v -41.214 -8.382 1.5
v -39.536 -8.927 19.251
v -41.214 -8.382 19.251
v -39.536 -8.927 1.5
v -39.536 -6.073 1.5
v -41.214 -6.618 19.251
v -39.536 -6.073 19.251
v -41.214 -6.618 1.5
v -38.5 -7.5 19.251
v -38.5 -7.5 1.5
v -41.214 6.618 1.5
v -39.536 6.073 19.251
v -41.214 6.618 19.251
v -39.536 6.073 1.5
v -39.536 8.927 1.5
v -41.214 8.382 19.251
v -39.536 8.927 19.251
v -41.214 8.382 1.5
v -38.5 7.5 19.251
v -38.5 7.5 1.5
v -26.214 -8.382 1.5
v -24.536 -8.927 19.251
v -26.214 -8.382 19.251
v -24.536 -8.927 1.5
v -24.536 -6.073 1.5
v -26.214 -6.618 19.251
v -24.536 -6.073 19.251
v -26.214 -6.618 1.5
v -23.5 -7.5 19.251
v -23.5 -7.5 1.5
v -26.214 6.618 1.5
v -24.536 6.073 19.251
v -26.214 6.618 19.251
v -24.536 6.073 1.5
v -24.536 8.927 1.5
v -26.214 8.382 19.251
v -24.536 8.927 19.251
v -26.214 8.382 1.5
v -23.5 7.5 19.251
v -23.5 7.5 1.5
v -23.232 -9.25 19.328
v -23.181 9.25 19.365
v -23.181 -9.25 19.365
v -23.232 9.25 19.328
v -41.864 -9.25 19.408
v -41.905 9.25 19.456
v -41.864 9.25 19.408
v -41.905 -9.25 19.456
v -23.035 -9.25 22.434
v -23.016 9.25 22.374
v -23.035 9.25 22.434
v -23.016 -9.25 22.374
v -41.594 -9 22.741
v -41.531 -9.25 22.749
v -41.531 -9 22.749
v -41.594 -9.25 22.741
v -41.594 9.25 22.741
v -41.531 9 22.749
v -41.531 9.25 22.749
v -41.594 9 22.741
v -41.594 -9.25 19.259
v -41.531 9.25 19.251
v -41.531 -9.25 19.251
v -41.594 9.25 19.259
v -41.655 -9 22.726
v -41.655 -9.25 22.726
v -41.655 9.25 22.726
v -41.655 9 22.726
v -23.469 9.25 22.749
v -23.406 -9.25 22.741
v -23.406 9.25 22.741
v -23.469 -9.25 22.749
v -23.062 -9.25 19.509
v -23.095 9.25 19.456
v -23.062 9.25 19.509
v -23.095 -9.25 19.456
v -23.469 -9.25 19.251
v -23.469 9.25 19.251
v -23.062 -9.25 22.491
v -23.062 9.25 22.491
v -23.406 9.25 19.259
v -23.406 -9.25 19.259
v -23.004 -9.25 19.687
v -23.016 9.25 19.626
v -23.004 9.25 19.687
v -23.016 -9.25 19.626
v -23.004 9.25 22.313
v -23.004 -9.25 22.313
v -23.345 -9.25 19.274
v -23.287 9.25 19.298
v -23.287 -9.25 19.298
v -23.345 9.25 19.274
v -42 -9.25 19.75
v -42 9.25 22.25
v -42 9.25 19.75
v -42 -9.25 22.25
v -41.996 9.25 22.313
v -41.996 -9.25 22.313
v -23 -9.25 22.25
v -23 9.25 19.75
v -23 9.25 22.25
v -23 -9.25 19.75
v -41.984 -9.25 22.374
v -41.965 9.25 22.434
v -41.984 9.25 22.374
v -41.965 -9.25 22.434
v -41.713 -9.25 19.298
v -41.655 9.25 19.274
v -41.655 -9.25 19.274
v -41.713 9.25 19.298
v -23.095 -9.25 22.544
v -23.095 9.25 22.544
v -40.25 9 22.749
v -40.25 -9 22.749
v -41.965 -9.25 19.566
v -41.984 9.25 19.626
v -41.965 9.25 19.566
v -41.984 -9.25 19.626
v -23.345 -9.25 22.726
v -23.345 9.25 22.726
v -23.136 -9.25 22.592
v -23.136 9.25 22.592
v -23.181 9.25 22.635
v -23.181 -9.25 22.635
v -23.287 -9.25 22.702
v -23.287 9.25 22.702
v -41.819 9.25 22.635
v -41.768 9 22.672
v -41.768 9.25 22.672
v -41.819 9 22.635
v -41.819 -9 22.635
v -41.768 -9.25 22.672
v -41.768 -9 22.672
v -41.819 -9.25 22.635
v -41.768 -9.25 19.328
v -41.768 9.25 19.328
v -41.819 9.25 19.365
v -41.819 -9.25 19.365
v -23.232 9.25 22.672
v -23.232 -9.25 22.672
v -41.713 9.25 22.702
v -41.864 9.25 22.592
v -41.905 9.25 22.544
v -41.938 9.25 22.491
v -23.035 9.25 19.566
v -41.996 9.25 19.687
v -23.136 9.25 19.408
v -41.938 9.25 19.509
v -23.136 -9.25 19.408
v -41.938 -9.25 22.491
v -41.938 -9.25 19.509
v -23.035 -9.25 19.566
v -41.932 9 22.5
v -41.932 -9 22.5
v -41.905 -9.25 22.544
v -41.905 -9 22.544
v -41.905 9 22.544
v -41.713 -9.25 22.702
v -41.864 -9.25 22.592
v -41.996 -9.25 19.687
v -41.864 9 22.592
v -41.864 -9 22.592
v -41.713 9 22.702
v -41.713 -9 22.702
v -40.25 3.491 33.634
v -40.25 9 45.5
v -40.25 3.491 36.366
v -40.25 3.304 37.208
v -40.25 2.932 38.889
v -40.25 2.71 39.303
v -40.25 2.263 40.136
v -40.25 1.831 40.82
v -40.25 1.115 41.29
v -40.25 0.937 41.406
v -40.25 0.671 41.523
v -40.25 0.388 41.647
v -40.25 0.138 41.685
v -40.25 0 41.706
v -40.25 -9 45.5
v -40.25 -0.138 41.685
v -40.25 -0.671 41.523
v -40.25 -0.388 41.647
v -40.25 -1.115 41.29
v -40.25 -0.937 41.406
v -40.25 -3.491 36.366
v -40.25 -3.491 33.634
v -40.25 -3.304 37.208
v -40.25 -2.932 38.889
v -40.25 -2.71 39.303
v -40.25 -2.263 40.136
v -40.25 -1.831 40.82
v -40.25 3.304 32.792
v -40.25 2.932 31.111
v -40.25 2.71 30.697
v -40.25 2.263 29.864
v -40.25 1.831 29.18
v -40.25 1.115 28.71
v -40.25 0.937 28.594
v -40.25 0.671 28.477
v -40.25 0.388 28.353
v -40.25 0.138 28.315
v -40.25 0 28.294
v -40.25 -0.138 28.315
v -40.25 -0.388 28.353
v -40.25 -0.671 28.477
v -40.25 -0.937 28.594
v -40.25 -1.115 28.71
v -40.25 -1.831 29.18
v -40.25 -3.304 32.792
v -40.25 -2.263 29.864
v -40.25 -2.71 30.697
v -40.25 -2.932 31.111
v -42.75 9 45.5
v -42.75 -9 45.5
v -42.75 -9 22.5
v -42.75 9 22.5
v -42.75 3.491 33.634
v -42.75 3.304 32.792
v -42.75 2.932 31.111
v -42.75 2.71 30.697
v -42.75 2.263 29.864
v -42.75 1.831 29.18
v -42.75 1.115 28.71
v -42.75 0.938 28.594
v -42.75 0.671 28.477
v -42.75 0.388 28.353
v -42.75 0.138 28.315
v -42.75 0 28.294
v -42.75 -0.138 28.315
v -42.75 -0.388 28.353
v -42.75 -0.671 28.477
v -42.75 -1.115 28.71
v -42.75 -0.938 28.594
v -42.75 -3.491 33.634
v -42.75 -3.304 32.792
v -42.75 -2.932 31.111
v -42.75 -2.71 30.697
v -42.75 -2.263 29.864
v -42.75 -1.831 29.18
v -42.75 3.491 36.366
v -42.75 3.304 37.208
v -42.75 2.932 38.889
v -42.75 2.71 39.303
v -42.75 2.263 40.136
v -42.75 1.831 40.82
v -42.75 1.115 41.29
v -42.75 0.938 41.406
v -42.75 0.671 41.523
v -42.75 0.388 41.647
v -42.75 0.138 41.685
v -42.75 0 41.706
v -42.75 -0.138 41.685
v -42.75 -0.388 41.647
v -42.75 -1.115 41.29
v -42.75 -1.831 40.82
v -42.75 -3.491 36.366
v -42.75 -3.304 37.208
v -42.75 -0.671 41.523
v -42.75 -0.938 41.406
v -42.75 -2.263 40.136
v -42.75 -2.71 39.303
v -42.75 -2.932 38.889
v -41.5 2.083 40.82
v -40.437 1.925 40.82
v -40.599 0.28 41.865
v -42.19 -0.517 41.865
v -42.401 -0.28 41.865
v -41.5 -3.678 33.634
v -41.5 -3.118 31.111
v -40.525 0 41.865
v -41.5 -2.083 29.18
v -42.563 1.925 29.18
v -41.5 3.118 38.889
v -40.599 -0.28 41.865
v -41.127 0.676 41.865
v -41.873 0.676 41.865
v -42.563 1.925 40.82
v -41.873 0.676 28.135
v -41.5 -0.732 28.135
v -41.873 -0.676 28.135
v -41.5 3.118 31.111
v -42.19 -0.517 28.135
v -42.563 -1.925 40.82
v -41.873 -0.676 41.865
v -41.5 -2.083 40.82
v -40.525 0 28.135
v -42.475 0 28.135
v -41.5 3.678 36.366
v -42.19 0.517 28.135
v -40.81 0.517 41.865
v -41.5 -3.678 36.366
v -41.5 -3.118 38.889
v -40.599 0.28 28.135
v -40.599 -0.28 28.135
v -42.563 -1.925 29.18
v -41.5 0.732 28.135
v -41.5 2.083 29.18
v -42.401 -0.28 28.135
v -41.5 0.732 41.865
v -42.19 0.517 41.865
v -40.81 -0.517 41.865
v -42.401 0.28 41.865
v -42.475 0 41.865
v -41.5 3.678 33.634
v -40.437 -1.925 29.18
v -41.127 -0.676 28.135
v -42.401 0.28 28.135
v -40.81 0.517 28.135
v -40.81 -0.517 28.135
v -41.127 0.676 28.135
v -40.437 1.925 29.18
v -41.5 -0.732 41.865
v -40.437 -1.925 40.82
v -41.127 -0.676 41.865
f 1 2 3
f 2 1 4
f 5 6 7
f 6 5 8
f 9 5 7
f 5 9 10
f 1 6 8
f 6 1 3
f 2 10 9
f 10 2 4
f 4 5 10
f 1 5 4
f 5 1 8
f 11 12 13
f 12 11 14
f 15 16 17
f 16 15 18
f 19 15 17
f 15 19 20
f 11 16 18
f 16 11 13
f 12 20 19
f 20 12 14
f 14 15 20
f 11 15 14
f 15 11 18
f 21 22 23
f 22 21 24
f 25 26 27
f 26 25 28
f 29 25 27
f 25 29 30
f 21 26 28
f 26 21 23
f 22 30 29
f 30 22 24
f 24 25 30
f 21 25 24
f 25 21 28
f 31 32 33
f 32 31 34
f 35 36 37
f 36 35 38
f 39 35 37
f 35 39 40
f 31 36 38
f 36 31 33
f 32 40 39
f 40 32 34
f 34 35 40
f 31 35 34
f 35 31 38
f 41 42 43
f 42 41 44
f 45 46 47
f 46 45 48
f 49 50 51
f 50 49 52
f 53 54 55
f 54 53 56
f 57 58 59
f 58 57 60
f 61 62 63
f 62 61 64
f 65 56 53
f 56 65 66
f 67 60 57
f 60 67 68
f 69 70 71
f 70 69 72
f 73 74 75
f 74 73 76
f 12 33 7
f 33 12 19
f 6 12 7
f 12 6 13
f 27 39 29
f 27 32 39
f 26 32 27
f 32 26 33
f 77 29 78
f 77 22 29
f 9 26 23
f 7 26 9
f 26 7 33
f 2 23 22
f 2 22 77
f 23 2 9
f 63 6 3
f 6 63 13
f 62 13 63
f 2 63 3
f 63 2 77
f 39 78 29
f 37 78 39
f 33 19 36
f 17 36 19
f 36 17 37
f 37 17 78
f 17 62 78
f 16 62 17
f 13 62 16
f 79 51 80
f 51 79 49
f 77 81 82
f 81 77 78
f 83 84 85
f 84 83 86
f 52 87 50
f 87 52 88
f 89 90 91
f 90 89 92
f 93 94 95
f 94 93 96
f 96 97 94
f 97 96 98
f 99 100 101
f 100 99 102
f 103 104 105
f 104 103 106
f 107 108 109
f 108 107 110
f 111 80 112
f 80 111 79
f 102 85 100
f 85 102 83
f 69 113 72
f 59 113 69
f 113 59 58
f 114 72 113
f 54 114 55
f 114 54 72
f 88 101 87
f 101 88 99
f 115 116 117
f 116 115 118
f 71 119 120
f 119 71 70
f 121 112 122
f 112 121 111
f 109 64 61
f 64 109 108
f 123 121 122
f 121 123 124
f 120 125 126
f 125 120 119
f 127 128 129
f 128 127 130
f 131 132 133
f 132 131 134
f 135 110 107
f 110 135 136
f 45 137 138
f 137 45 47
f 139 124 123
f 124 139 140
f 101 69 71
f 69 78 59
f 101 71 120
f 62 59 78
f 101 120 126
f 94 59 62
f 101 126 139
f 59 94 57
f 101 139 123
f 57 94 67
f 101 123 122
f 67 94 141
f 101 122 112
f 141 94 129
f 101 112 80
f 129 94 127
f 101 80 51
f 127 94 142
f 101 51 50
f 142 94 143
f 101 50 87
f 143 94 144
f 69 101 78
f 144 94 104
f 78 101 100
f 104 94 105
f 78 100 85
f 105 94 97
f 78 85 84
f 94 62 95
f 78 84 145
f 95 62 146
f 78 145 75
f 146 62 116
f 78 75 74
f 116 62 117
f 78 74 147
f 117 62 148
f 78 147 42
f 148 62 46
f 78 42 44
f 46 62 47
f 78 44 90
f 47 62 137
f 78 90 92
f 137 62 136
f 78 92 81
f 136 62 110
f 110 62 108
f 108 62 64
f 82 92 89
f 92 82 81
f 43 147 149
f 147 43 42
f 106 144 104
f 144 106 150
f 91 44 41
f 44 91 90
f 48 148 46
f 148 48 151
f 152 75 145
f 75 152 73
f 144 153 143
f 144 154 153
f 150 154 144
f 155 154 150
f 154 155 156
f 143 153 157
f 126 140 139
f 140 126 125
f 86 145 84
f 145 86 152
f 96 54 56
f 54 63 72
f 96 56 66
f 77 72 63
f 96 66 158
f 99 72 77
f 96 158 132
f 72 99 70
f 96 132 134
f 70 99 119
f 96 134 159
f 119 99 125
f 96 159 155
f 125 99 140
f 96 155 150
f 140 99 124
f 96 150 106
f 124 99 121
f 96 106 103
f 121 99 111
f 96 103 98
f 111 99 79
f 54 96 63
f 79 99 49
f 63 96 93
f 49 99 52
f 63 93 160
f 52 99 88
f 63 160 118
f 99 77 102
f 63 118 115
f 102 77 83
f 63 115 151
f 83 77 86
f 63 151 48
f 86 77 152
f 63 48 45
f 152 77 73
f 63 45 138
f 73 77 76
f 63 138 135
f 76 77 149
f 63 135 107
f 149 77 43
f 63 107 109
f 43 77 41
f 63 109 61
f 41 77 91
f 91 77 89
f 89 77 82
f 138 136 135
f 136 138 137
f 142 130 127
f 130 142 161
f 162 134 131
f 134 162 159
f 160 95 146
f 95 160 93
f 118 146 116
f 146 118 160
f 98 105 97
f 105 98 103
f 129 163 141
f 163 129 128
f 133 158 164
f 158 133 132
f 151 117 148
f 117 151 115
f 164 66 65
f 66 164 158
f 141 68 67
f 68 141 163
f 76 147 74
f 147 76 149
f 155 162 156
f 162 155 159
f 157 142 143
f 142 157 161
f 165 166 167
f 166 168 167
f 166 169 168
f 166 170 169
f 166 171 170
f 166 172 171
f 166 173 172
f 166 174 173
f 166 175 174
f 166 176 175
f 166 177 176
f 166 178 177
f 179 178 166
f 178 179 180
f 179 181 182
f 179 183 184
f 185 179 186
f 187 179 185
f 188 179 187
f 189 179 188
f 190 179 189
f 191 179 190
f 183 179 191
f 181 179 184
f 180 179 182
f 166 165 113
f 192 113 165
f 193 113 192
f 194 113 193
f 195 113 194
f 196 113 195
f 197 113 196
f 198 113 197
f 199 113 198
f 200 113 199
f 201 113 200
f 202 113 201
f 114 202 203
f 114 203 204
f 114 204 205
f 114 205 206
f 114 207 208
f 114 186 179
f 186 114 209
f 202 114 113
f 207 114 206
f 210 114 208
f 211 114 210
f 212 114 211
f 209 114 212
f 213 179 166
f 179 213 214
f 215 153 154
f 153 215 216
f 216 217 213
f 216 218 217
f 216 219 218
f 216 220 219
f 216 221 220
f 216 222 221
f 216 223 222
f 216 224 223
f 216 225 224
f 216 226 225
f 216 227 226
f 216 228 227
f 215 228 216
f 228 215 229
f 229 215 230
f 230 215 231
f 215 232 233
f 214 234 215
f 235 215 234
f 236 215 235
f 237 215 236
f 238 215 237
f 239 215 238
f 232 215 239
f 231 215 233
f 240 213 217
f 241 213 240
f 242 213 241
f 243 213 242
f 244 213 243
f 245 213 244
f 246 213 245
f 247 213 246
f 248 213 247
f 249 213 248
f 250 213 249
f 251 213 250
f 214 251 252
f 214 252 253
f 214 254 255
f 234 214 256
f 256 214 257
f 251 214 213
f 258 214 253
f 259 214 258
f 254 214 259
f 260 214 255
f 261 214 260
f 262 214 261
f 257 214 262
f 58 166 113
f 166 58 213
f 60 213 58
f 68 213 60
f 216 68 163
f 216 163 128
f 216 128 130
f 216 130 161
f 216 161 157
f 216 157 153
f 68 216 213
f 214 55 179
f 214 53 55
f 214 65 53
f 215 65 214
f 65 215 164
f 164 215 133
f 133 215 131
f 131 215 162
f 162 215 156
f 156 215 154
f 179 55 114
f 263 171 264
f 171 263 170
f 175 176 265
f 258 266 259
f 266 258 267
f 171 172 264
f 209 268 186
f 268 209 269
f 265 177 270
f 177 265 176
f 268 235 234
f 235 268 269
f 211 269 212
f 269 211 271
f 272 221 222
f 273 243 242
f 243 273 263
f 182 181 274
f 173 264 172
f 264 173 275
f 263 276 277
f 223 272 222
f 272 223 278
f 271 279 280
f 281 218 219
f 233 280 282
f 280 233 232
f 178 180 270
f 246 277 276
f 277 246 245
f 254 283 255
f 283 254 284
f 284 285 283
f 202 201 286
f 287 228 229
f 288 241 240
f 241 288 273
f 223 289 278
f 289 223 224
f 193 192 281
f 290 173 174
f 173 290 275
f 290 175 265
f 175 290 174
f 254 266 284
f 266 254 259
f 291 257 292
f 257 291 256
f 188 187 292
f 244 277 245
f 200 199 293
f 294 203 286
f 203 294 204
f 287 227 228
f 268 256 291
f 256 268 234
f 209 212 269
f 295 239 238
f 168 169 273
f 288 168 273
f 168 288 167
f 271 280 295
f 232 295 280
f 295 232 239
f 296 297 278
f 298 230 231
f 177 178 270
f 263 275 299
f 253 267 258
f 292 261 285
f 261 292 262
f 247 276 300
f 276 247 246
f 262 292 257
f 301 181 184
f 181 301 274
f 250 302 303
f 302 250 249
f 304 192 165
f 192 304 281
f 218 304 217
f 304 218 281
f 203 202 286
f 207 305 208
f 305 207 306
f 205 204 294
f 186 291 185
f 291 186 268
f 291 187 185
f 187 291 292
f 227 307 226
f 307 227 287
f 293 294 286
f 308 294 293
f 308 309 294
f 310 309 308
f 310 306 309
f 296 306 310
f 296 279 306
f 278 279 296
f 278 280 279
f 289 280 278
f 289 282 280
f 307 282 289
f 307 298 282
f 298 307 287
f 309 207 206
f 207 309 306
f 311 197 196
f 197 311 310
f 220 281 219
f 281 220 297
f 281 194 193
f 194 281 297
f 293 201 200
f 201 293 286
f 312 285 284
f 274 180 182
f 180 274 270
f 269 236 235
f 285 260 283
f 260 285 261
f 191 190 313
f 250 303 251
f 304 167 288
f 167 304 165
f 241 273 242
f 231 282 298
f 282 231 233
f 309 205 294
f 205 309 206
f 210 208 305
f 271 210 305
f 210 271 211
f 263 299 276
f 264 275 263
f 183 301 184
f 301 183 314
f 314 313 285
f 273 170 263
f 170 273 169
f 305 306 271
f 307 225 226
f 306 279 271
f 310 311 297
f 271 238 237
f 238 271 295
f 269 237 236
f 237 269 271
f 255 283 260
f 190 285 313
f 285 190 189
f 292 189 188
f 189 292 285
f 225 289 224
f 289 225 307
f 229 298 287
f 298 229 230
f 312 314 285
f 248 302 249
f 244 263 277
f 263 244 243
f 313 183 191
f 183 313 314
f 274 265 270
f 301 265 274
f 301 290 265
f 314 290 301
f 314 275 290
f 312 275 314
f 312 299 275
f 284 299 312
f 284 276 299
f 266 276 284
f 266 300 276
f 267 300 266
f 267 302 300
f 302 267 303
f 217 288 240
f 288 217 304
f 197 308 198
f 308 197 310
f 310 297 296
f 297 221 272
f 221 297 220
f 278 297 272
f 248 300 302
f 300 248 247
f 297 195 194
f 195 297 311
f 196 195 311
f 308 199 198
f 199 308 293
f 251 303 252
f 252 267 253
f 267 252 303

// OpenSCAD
module piso()
{
    cube([100,100,3], center=true);
}

module mesa()
{
    //30 pulgadas es el tamano normal de un mesa
    //primer pierna
    translate([-20,-20,1.5])cylinder(h=30,r=1.5);
    //segunda pierna
    translate([-20,20,1.5])cylinder(h=30,r=1.5);
    //tercera pierna
    translate([20,-20,1.5])cylinder(h=30,r=1.5);
    //cuarta pierna
    translate([20,20,1.5])cylinder(h=30,r=1.5);
    
    //tapa de la mesa
    //altura mitad piso(z) + mitad mesa(z) + altura pata
    translate([0,0,33])cube([45,45,3],center=true);
}

module sillaBase()
{
    translate([-40,-7.5,1.5])cylinder(h=18,r=1.5);
    
    translate([-40,7.5,1.5])cylinder(h=18,r=1.5);
    
    translate([-25,-7.5,1.5])cylinder(h=18,r=1.5);
    
    translate([-25,7.5,1.5])cylinder(h=18,r=1.5);
    
    //altura mitad piso(z) + mitad mesa(z) + altura pata
    translate([-32.5,0,21])minkowski()
    {
        cube([18,18,2.5],center=true);
        rotate([90,0,0])cylinder(h=0.5, r=0.5, center=true,$fn=50);
    }
}

module espaldar()
{
    difference(){
    translate([-41.5,0,34])cube([2.5,18,23],center=true);
    translate([-41.5,0,35])scale([1,.75,1.4])sphere(5);     
    }
}

module silla()
{
        sillaBase();
        espaldar();
}

silla();
